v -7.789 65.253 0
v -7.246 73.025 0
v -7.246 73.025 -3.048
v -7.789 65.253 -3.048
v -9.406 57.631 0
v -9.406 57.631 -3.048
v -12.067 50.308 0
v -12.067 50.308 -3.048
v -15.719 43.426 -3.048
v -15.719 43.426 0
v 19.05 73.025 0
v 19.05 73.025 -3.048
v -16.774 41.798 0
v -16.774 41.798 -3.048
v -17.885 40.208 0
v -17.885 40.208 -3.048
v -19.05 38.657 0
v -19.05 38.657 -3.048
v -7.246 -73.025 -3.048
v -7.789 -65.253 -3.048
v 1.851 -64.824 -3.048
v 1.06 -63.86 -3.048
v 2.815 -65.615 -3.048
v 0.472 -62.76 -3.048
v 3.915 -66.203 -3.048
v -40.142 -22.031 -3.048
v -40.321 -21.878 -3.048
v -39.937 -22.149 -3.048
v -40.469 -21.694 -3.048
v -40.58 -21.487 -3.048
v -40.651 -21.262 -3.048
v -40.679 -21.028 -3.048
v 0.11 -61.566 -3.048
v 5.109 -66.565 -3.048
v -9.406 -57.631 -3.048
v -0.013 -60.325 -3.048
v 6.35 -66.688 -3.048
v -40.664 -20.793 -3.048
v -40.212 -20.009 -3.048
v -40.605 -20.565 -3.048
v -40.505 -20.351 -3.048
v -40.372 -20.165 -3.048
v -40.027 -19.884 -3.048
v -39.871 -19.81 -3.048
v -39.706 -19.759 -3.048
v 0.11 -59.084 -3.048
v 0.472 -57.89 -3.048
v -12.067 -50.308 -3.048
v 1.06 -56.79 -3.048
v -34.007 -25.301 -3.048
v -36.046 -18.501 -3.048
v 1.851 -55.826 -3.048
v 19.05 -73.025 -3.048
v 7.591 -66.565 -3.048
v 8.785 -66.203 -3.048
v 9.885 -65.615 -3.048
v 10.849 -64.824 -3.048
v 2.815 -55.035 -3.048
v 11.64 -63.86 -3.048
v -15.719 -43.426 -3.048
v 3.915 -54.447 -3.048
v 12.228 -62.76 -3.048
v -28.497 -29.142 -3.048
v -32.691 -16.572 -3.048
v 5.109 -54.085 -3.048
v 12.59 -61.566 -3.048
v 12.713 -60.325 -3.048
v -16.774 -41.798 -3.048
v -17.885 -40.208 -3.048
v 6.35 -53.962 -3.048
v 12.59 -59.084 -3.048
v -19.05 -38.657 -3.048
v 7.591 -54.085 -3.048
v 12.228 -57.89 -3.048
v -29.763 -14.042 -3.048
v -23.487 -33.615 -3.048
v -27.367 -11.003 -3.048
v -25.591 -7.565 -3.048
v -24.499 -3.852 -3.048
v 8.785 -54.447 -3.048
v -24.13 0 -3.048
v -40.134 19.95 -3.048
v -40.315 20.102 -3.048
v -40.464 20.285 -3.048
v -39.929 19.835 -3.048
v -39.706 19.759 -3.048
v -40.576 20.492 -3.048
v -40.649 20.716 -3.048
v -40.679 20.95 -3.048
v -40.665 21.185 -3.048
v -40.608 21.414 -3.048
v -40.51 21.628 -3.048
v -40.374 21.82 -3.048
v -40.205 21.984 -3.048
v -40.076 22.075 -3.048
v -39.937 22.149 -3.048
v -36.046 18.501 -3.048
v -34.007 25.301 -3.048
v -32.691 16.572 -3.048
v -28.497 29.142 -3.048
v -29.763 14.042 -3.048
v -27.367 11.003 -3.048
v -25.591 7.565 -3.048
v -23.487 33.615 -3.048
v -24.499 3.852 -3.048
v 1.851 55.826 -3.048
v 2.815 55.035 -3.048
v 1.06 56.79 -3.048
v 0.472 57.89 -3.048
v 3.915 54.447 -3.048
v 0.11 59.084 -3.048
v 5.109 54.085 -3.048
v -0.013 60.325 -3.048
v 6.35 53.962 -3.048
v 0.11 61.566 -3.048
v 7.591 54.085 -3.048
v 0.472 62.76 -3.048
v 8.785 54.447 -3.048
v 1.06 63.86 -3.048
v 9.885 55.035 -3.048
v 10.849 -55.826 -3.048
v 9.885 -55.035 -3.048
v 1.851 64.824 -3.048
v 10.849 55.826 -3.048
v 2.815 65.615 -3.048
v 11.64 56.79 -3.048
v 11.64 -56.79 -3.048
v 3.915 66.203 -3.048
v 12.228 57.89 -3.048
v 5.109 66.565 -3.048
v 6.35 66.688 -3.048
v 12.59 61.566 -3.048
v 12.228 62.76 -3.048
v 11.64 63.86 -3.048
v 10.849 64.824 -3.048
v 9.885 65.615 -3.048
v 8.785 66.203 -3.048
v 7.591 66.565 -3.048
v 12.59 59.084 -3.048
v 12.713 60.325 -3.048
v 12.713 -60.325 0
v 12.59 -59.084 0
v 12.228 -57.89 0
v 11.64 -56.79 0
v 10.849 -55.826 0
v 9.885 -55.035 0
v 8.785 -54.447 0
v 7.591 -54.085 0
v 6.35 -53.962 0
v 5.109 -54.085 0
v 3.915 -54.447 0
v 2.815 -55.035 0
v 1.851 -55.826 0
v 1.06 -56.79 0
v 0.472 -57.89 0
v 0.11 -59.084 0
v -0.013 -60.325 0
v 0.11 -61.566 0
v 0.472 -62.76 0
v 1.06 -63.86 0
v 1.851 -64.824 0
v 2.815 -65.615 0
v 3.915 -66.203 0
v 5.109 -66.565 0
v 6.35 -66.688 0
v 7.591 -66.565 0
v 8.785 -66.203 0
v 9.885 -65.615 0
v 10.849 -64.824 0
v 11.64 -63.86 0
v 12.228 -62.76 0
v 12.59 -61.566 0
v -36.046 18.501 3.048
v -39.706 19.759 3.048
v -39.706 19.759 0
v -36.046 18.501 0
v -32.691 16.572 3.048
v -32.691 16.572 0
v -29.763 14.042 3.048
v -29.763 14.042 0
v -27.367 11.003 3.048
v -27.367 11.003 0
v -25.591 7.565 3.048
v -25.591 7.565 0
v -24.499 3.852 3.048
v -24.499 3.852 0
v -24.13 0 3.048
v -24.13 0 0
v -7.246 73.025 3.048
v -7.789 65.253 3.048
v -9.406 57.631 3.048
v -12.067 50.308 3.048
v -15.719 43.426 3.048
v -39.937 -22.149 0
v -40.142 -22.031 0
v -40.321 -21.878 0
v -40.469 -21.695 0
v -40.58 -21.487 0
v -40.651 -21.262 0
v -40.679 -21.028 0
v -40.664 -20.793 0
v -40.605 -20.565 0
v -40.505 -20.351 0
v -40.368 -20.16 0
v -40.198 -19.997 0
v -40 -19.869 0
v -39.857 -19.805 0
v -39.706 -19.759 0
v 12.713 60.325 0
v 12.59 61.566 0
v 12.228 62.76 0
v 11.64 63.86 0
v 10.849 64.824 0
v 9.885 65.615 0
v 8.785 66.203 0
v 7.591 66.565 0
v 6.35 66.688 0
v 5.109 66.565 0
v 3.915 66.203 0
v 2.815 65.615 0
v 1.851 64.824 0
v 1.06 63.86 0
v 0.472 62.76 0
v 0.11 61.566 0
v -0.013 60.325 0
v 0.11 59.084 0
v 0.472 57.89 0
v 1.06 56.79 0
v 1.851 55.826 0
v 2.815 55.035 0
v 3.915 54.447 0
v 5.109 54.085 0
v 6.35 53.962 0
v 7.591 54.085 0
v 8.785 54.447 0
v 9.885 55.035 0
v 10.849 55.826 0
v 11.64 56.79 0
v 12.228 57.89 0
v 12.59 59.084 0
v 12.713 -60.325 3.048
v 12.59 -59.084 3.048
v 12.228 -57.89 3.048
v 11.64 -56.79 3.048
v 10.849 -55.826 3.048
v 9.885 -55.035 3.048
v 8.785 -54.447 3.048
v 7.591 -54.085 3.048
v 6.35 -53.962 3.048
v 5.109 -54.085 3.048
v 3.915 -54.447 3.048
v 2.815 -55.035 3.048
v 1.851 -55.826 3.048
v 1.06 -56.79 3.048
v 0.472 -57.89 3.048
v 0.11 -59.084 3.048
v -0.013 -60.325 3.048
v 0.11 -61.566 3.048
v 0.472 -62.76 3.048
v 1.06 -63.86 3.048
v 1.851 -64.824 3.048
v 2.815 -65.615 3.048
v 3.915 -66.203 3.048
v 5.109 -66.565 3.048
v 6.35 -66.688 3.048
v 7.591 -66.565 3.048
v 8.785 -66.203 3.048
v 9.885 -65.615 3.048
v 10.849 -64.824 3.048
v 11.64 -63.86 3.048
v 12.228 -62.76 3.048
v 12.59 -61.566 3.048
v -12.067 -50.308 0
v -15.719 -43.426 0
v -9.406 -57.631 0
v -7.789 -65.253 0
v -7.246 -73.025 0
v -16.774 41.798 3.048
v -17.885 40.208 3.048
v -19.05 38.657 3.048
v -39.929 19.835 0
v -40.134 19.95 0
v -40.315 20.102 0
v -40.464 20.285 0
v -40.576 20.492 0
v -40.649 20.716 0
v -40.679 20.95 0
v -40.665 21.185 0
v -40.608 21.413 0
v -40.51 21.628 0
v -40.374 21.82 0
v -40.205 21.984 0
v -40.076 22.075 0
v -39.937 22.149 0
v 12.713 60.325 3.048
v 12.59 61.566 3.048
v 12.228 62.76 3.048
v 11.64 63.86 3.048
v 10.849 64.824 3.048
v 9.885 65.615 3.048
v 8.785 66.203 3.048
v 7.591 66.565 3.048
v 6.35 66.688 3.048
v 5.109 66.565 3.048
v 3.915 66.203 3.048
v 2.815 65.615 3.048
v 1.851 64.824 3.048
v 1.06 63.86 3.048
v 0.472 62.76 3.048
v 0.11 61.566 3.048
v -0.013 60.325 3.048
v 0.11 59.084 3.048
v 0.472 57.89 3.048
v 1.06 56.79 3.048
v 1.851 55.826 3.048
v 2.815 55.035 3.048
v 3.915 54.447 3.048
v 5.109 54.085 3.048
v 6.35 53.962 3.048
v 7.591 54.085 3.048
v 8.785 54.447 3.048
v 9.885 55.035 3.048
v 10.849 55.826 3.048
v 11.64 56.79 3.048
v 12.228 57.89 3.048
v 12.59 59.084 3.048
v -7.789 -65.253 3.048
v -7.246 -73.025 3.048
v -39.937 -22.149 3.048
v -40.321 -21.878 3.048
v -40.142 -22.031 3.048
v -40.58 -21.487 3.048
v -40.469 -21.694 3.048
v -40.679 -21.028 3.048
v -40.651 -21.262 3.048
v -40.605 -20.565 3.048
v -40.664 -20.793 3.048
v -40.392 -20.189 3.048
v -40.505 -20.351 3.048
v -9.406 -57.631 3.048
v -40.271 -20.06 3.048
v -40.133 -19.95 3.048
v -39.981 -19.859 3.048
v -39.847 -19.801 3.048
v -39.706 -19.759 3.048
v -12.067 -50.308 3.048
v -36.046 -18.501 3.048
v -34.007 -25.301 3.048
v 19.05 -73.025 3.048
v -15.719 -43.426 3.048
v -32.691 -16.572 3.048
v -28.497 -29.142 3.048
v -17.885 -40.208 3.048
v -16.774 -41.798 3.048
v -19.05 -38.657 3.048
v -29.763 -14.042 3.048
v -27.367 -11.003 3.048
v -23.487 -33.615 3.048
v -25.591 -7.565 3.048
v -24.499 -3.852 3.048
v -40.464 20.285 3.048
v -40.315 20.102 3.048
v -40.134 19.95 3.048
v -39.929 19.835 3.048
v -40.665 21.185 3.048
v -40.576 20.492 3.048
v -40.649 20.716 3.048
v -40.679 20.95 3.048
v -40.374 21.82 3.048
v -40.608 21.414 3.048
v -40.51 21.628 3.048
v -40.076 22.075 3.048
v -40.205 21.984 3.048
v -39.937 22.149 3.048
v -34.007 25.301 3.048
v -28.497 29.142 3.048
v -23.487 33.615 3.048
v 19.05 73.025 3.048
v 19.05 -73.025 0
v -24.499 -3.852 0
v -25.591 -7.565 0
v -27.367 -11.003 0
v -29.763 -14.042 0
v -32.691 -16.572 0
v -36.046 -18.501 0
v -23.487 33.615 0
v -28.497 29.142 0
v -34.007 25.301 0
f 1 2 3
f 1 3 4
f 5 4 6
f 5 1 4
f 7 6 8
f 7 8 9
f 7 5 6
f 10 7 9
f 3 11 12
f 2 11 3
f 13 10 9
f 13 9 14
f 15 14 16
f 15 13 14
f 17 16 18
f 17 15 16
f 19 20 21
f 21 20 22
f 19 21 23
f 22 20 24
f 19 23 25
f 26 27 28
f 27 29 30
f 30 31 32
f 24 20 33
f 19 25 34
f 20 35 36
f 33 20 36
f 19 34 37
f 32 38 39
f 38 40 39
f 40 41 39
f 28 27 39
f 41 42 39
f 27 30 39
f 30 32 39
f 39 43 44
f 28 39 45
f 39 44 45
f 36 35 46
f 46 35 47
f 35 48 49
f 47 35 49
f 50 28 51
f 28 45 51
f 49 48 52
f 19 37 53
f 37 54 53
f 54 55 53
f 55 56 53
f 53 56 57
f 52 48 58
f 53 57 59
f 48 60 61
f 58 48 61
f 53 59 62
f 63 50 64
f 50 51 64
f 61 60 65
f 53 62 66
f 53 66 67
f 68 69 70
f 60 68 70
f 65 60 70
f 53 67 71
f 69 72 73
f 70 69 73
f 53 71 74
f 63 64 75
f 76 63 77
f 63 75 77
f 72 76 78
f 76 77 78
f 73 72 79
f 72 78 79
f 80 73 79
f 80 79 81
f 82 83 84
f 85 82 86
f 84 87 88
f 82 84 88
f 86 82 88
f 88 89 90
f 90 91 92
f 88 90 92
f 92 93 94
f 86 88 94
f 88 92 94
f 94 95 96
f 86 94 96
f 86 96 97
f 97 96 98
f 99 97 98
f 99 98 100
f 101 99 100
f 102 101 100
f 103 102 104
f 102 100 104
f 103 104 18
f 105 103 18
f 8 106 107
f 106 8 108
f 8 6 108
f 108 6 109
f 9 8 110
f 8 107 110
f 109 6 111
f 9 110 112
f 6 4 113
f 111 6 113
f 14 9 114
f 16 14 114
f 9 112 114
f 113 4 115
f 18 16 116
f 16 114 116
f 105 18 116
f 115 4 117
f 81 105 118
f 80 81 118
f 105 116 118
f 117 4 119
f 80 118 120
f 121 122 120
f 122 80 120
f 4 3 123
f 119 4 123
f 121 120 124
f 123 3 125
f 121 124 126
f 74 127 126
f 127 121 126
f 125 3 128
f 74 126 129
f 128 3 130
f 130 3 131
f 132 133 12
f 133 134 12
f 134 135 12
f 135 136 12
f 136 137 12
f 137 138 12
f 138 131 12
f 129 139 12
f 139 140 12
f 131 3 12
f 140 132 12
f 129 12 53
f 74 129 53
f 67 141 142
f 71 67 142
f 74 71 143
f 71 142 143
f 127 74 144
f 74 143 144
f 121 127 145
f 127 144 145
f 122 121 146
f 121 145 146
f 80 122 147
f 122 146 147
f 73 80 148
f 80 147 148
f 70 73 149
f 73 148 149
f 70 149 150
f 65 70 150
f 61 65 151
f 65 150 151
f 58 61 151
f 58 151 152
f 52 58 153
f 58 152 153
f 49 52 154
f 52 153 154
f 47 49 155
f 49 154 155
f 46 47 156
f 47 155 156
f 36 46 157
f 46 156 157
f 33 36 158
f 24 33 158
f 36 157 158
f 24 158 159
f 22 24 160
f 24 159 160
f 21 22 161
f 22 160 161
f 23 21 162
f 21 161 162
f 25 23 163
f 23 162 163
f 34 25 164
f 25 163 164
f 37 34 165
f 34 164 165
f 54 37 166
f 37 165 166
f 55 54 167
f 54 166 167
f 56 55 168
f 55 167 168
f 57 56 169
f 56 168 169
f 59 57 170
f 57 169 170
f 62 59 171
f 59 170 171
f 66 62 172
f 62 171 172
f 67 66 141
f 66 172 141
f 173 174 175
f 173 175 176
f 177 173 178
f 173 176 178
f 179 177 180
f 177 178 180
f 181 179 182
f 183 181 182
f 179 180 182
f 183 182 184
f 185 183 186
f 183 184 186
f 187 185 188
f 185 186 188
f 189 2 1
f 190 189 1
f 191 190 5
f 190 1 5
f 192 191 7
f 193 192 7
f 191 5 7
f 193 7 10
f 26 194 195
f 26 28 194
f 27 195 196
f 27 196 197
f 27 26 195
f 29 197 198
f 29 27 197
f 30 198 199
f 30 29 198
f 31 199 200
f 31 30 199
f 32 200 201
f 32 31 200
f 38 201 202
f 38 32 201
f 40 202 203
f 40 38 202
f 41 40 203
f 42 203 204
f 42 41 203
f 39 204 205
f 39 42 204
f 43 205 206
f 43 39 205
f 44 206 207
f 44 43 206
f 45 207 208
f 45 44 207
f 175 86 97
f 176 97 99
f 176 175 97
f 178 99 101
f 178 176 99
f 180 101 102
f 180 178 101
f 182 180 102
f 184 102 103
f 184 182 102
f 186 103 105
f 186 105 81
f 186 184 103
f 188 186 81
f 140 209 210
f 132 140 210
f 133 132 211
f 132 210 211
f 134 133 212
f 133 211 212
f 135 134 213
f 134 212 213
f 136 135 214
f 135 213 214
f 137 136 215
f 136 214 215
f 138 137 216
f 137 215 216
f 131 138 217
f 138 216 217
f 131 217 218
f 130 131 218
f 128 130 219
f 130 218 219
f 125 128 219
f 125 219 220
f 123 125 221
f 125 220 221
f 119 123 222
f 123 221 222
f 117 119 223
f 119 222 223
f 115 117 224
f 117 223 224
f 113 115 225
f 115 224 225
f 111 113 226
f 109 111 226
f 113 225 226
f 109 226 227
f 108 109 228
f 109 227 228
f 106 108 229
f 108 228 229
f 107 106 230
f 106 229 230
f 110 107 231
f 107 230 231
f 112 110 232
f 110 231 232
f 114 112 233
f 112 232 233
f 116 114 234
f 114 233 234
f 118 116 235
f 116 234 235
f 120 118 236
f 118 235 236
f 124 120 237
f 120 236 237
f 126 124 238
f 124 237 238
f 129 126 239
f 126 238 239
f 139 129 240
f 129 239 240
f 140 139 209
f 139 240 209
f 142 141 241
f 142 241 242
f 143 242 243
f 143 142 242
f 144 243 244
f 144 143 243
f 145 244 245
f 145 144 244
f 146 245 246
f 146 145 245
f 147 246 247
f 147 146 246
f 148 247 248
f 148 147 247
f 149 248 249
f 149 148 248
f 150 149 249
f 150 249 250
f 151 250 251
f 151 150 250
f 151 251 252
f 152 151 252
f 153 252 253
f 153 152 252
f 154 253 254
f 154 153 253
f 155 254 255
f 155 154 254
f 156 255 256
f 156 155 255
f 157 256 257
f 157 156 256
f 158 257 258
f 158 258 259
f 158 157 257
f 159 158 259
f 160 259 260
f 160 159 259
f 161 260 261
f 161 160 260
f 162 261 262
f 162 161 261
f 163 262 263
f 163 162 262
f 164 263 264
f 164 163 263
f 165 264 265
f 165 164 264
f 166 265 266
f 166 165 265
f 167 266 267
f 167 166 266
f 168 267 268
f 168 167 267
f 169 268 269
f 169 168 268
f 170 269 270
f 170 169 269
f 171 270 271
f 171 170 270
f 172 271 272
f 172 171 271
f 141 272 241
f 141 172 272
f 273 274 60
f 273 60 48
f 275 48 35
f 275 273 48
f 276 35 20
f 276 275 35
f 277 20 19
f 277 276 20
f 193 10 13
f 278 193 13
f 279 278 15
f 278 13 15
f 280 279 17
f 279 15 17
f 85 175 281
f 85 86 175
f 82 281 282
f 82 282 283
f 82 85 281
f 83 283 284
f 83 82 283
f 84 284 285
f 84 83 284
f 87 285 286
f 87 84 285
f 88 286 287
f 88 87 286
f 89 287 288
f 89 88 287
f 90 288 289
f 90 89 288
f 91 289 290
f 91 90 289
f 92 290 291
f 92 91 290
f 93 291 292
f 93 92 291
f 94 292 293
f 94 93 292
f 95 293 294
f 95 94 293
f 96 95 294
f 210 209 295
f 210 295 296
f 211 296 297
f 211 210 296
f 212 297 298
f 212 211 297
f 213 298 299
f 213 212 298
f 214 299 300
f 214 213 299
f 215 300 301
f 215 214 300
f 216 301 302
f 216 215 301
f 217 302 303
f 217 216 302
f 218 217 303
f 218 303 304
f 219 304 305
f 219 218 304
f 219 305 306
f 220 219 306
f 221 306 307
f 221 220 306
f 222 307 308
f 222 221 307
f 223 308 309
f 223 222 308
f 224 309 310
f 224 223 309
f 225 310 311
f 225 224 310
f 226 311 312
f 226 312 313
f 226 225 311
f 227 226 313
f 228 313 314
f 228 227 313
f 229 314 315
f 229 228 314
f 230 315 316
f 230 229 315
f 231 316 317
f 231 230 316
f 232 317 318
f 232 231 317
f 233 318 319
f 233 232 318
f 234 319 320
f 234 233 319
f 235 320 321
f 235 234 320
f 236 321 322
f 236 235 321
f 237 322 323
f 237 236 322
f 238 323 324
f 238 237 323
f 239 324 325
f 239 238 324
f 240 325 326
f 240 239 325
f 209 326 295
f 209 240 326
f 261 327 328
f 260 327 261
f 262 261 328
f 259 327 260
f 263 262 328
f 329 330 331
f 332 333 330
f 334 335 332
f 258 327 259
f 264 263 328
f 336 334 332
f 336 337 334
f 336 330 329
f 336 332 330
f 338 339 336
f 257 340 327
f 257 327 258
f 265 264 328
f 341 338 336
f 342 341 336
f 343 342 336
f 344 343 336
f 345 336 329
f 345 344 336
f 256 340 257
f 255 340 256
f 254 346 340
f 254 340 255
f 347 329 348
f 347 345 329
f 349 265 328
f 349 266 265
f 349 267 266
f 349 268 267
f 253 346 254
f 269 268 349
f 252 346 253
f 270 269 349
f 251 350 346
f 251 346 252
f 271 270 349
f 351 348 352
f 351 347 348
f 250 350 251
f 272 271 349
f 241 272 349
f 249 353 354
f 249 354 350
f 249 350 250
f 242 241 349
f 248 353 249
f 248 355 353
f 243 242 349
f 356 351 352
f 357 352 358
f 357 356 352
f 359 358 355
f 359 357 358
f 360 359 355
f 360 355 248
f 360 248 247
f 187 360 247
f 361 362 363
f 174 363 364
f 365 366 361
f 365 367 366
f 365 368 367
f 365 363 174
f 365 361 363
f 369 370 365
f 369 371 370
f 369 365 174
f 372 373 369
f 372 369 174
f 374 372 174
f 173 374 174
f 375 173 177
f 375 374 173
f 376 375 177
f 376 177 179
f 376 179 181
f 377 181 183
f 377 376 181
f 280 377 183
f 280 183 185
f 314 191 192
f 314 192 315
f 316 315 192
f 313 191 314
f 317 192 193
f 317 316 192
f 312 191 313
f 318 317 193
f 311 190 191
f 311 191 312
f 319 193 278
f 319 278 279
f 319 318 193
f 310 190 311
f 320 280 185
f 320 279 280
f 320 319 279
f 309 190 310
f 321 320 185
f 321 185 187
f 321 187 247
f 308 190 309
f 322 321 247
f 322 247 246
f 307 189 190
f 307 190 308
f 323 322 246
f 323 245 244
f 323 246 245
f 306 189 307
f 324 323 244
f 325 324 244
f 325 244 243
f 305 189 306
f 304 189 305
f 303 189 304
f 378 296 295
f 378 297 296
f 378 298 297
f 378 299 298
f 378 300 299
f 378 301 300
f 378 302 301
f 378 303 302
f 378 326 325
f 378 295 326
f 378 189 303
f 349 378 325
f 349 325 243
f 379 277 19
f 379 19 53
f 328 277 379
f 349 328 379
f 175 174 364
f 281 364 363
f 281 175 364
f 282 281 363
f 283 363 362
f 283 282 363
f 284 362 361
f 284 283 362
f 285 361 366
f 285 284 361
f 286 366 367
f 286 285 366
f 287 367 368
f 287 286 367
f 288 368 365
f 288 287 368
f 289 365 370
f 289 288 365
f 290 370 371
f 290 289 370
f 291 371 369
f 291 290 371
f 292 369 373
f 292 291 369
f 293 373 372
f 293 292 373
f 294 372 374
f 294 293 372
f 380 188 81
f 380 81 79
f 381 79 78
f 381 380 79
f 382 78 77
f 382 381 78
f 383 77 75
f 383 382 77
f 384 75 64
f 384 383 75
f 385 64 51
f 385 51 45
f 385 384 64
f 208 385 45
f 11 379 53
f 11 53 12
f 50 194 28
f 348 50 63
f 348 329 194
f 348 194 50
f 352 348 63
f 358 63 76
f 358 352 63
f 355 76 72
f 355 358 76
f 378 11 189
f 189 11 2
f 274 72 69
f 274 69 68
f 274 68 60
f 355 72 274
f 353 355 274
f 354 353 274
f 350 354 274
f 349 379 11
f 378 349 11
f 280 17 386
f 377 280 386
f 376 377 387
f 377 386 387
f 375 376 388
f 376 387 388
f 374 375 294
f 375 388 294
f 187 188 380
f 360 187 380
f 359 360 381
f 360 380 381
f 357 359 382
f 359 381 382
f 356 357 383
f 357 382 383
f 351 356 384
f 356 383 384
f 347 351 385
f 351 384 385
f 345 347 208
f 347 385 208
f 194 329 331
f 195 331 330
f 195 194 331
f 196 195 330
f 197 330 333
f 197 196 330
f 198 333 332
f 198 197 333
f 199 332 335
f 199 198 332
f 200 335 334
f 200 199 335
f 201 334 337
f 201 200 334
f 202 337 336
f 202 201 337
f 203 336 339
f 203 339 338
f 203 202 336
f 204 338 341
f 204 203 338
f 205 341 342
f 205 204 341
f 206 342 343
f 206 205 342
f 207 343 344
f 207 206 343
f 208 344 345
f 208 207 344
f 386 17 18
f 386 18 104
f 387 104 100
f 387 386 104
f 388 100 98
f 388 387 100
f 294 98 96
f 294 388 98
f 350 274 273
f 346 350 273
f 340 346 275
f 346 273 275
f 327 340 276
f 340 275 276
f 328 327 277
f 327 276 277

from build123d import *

# Parameters (mm, degrees)
SKETCH1_R           = 6.3627
BOSS_EXTRUDE1_DEPTH = 3.048
FILLET1_R           = 1.27


with BuildPart() as part:
    # Sketch1 → Boss-Extrude1 (new body, symmetric)
    with BuildSketch(Plane.XY):
        with BuildLine():
            ThreePointArc((-44.45, -20.32), (-30.440021806, -27.674009584), (-19.05, -38.657103373))
            Line((-19.05, -38.657103373), (-19.05, 38.657103373))
            ThreePointArc((-19.05, 38.657103373), (-30.440021806, 27.674009584), (-44.45, 20.32))
            ThreePointArc((-44.45, 20.32), (-30.081590206, 14.368409794), (-24.13, 0))
            ThreePointArc((-24.13, 0), (-30.081590206, -14.368409794), (-44.45, -20.32))
        make_face()
        with BuildLine():
            ThreePointArc((-19.05, -38.657103373), (-17.322621511, -40.998313496), (-15.719319348, -43.426177466))
            ThreePointArc((-15.719319348, -43.426177466), (1.415517775, -24.650338319), (7.62, 0))
            ThreePointArc((7.62, 0), (1.415517775, 24.650338319), (-15.719319348, 43.426177466))
            ThreePointArc((-15.719319348, 43.426177466), (-17.322621511, 40.998313496), (-19.05, 38.657103373))
            Line((-19.05, 38.657103373), (-19.05, -38.657103373))
        make_face()
        with BuildLine():
            ThreePointArc((-15.719319348, -43.426177466), (-9.406121761, -57.631125381), (-7.246114065, -73.025))
            Line((-7.246114065, -73.025), (19.05, -73.025))
            Line((19.05, -73.025), (19.05, 73.025))
            Line((19.05, 73.025), (-7.246114065, 73.025))
            ThreePointArc((-7.246114065, 73.025), (-9.406121761, 57.631125381), (-15.719319348, 43.426177466))
            ThreePointArc((-15.719319348, 43.426177466), (1.415517775, 24.650338319), (7.62, 0))
            ThreePointArc((7.62, 0), (1.415517775, -24.650338319), (-15.719319348, -43.426177466))
        make_face()
        with Locations((6.35, -60.325)):
            Circle(SKETCH1_R, mode=Mode.SUBTRACT)
        with Locations((6.35, 60.325)):
            Circle(SKETCH1_R, mode=Mode.SUBTRACT)
    extrude(amount=BOSS_EXTRUDE1_DEPTH, both=True)

    # Fillet1
    fillet1_edges = [part.edges().sort_by_distance(p)[0] for p in [
        (-44.45, -20.32, 0),
        (-44.45, 20.32, 0),
    ]]
    fillet(fillet1_edges, radius=FILLET1_R)


solid = part.part
